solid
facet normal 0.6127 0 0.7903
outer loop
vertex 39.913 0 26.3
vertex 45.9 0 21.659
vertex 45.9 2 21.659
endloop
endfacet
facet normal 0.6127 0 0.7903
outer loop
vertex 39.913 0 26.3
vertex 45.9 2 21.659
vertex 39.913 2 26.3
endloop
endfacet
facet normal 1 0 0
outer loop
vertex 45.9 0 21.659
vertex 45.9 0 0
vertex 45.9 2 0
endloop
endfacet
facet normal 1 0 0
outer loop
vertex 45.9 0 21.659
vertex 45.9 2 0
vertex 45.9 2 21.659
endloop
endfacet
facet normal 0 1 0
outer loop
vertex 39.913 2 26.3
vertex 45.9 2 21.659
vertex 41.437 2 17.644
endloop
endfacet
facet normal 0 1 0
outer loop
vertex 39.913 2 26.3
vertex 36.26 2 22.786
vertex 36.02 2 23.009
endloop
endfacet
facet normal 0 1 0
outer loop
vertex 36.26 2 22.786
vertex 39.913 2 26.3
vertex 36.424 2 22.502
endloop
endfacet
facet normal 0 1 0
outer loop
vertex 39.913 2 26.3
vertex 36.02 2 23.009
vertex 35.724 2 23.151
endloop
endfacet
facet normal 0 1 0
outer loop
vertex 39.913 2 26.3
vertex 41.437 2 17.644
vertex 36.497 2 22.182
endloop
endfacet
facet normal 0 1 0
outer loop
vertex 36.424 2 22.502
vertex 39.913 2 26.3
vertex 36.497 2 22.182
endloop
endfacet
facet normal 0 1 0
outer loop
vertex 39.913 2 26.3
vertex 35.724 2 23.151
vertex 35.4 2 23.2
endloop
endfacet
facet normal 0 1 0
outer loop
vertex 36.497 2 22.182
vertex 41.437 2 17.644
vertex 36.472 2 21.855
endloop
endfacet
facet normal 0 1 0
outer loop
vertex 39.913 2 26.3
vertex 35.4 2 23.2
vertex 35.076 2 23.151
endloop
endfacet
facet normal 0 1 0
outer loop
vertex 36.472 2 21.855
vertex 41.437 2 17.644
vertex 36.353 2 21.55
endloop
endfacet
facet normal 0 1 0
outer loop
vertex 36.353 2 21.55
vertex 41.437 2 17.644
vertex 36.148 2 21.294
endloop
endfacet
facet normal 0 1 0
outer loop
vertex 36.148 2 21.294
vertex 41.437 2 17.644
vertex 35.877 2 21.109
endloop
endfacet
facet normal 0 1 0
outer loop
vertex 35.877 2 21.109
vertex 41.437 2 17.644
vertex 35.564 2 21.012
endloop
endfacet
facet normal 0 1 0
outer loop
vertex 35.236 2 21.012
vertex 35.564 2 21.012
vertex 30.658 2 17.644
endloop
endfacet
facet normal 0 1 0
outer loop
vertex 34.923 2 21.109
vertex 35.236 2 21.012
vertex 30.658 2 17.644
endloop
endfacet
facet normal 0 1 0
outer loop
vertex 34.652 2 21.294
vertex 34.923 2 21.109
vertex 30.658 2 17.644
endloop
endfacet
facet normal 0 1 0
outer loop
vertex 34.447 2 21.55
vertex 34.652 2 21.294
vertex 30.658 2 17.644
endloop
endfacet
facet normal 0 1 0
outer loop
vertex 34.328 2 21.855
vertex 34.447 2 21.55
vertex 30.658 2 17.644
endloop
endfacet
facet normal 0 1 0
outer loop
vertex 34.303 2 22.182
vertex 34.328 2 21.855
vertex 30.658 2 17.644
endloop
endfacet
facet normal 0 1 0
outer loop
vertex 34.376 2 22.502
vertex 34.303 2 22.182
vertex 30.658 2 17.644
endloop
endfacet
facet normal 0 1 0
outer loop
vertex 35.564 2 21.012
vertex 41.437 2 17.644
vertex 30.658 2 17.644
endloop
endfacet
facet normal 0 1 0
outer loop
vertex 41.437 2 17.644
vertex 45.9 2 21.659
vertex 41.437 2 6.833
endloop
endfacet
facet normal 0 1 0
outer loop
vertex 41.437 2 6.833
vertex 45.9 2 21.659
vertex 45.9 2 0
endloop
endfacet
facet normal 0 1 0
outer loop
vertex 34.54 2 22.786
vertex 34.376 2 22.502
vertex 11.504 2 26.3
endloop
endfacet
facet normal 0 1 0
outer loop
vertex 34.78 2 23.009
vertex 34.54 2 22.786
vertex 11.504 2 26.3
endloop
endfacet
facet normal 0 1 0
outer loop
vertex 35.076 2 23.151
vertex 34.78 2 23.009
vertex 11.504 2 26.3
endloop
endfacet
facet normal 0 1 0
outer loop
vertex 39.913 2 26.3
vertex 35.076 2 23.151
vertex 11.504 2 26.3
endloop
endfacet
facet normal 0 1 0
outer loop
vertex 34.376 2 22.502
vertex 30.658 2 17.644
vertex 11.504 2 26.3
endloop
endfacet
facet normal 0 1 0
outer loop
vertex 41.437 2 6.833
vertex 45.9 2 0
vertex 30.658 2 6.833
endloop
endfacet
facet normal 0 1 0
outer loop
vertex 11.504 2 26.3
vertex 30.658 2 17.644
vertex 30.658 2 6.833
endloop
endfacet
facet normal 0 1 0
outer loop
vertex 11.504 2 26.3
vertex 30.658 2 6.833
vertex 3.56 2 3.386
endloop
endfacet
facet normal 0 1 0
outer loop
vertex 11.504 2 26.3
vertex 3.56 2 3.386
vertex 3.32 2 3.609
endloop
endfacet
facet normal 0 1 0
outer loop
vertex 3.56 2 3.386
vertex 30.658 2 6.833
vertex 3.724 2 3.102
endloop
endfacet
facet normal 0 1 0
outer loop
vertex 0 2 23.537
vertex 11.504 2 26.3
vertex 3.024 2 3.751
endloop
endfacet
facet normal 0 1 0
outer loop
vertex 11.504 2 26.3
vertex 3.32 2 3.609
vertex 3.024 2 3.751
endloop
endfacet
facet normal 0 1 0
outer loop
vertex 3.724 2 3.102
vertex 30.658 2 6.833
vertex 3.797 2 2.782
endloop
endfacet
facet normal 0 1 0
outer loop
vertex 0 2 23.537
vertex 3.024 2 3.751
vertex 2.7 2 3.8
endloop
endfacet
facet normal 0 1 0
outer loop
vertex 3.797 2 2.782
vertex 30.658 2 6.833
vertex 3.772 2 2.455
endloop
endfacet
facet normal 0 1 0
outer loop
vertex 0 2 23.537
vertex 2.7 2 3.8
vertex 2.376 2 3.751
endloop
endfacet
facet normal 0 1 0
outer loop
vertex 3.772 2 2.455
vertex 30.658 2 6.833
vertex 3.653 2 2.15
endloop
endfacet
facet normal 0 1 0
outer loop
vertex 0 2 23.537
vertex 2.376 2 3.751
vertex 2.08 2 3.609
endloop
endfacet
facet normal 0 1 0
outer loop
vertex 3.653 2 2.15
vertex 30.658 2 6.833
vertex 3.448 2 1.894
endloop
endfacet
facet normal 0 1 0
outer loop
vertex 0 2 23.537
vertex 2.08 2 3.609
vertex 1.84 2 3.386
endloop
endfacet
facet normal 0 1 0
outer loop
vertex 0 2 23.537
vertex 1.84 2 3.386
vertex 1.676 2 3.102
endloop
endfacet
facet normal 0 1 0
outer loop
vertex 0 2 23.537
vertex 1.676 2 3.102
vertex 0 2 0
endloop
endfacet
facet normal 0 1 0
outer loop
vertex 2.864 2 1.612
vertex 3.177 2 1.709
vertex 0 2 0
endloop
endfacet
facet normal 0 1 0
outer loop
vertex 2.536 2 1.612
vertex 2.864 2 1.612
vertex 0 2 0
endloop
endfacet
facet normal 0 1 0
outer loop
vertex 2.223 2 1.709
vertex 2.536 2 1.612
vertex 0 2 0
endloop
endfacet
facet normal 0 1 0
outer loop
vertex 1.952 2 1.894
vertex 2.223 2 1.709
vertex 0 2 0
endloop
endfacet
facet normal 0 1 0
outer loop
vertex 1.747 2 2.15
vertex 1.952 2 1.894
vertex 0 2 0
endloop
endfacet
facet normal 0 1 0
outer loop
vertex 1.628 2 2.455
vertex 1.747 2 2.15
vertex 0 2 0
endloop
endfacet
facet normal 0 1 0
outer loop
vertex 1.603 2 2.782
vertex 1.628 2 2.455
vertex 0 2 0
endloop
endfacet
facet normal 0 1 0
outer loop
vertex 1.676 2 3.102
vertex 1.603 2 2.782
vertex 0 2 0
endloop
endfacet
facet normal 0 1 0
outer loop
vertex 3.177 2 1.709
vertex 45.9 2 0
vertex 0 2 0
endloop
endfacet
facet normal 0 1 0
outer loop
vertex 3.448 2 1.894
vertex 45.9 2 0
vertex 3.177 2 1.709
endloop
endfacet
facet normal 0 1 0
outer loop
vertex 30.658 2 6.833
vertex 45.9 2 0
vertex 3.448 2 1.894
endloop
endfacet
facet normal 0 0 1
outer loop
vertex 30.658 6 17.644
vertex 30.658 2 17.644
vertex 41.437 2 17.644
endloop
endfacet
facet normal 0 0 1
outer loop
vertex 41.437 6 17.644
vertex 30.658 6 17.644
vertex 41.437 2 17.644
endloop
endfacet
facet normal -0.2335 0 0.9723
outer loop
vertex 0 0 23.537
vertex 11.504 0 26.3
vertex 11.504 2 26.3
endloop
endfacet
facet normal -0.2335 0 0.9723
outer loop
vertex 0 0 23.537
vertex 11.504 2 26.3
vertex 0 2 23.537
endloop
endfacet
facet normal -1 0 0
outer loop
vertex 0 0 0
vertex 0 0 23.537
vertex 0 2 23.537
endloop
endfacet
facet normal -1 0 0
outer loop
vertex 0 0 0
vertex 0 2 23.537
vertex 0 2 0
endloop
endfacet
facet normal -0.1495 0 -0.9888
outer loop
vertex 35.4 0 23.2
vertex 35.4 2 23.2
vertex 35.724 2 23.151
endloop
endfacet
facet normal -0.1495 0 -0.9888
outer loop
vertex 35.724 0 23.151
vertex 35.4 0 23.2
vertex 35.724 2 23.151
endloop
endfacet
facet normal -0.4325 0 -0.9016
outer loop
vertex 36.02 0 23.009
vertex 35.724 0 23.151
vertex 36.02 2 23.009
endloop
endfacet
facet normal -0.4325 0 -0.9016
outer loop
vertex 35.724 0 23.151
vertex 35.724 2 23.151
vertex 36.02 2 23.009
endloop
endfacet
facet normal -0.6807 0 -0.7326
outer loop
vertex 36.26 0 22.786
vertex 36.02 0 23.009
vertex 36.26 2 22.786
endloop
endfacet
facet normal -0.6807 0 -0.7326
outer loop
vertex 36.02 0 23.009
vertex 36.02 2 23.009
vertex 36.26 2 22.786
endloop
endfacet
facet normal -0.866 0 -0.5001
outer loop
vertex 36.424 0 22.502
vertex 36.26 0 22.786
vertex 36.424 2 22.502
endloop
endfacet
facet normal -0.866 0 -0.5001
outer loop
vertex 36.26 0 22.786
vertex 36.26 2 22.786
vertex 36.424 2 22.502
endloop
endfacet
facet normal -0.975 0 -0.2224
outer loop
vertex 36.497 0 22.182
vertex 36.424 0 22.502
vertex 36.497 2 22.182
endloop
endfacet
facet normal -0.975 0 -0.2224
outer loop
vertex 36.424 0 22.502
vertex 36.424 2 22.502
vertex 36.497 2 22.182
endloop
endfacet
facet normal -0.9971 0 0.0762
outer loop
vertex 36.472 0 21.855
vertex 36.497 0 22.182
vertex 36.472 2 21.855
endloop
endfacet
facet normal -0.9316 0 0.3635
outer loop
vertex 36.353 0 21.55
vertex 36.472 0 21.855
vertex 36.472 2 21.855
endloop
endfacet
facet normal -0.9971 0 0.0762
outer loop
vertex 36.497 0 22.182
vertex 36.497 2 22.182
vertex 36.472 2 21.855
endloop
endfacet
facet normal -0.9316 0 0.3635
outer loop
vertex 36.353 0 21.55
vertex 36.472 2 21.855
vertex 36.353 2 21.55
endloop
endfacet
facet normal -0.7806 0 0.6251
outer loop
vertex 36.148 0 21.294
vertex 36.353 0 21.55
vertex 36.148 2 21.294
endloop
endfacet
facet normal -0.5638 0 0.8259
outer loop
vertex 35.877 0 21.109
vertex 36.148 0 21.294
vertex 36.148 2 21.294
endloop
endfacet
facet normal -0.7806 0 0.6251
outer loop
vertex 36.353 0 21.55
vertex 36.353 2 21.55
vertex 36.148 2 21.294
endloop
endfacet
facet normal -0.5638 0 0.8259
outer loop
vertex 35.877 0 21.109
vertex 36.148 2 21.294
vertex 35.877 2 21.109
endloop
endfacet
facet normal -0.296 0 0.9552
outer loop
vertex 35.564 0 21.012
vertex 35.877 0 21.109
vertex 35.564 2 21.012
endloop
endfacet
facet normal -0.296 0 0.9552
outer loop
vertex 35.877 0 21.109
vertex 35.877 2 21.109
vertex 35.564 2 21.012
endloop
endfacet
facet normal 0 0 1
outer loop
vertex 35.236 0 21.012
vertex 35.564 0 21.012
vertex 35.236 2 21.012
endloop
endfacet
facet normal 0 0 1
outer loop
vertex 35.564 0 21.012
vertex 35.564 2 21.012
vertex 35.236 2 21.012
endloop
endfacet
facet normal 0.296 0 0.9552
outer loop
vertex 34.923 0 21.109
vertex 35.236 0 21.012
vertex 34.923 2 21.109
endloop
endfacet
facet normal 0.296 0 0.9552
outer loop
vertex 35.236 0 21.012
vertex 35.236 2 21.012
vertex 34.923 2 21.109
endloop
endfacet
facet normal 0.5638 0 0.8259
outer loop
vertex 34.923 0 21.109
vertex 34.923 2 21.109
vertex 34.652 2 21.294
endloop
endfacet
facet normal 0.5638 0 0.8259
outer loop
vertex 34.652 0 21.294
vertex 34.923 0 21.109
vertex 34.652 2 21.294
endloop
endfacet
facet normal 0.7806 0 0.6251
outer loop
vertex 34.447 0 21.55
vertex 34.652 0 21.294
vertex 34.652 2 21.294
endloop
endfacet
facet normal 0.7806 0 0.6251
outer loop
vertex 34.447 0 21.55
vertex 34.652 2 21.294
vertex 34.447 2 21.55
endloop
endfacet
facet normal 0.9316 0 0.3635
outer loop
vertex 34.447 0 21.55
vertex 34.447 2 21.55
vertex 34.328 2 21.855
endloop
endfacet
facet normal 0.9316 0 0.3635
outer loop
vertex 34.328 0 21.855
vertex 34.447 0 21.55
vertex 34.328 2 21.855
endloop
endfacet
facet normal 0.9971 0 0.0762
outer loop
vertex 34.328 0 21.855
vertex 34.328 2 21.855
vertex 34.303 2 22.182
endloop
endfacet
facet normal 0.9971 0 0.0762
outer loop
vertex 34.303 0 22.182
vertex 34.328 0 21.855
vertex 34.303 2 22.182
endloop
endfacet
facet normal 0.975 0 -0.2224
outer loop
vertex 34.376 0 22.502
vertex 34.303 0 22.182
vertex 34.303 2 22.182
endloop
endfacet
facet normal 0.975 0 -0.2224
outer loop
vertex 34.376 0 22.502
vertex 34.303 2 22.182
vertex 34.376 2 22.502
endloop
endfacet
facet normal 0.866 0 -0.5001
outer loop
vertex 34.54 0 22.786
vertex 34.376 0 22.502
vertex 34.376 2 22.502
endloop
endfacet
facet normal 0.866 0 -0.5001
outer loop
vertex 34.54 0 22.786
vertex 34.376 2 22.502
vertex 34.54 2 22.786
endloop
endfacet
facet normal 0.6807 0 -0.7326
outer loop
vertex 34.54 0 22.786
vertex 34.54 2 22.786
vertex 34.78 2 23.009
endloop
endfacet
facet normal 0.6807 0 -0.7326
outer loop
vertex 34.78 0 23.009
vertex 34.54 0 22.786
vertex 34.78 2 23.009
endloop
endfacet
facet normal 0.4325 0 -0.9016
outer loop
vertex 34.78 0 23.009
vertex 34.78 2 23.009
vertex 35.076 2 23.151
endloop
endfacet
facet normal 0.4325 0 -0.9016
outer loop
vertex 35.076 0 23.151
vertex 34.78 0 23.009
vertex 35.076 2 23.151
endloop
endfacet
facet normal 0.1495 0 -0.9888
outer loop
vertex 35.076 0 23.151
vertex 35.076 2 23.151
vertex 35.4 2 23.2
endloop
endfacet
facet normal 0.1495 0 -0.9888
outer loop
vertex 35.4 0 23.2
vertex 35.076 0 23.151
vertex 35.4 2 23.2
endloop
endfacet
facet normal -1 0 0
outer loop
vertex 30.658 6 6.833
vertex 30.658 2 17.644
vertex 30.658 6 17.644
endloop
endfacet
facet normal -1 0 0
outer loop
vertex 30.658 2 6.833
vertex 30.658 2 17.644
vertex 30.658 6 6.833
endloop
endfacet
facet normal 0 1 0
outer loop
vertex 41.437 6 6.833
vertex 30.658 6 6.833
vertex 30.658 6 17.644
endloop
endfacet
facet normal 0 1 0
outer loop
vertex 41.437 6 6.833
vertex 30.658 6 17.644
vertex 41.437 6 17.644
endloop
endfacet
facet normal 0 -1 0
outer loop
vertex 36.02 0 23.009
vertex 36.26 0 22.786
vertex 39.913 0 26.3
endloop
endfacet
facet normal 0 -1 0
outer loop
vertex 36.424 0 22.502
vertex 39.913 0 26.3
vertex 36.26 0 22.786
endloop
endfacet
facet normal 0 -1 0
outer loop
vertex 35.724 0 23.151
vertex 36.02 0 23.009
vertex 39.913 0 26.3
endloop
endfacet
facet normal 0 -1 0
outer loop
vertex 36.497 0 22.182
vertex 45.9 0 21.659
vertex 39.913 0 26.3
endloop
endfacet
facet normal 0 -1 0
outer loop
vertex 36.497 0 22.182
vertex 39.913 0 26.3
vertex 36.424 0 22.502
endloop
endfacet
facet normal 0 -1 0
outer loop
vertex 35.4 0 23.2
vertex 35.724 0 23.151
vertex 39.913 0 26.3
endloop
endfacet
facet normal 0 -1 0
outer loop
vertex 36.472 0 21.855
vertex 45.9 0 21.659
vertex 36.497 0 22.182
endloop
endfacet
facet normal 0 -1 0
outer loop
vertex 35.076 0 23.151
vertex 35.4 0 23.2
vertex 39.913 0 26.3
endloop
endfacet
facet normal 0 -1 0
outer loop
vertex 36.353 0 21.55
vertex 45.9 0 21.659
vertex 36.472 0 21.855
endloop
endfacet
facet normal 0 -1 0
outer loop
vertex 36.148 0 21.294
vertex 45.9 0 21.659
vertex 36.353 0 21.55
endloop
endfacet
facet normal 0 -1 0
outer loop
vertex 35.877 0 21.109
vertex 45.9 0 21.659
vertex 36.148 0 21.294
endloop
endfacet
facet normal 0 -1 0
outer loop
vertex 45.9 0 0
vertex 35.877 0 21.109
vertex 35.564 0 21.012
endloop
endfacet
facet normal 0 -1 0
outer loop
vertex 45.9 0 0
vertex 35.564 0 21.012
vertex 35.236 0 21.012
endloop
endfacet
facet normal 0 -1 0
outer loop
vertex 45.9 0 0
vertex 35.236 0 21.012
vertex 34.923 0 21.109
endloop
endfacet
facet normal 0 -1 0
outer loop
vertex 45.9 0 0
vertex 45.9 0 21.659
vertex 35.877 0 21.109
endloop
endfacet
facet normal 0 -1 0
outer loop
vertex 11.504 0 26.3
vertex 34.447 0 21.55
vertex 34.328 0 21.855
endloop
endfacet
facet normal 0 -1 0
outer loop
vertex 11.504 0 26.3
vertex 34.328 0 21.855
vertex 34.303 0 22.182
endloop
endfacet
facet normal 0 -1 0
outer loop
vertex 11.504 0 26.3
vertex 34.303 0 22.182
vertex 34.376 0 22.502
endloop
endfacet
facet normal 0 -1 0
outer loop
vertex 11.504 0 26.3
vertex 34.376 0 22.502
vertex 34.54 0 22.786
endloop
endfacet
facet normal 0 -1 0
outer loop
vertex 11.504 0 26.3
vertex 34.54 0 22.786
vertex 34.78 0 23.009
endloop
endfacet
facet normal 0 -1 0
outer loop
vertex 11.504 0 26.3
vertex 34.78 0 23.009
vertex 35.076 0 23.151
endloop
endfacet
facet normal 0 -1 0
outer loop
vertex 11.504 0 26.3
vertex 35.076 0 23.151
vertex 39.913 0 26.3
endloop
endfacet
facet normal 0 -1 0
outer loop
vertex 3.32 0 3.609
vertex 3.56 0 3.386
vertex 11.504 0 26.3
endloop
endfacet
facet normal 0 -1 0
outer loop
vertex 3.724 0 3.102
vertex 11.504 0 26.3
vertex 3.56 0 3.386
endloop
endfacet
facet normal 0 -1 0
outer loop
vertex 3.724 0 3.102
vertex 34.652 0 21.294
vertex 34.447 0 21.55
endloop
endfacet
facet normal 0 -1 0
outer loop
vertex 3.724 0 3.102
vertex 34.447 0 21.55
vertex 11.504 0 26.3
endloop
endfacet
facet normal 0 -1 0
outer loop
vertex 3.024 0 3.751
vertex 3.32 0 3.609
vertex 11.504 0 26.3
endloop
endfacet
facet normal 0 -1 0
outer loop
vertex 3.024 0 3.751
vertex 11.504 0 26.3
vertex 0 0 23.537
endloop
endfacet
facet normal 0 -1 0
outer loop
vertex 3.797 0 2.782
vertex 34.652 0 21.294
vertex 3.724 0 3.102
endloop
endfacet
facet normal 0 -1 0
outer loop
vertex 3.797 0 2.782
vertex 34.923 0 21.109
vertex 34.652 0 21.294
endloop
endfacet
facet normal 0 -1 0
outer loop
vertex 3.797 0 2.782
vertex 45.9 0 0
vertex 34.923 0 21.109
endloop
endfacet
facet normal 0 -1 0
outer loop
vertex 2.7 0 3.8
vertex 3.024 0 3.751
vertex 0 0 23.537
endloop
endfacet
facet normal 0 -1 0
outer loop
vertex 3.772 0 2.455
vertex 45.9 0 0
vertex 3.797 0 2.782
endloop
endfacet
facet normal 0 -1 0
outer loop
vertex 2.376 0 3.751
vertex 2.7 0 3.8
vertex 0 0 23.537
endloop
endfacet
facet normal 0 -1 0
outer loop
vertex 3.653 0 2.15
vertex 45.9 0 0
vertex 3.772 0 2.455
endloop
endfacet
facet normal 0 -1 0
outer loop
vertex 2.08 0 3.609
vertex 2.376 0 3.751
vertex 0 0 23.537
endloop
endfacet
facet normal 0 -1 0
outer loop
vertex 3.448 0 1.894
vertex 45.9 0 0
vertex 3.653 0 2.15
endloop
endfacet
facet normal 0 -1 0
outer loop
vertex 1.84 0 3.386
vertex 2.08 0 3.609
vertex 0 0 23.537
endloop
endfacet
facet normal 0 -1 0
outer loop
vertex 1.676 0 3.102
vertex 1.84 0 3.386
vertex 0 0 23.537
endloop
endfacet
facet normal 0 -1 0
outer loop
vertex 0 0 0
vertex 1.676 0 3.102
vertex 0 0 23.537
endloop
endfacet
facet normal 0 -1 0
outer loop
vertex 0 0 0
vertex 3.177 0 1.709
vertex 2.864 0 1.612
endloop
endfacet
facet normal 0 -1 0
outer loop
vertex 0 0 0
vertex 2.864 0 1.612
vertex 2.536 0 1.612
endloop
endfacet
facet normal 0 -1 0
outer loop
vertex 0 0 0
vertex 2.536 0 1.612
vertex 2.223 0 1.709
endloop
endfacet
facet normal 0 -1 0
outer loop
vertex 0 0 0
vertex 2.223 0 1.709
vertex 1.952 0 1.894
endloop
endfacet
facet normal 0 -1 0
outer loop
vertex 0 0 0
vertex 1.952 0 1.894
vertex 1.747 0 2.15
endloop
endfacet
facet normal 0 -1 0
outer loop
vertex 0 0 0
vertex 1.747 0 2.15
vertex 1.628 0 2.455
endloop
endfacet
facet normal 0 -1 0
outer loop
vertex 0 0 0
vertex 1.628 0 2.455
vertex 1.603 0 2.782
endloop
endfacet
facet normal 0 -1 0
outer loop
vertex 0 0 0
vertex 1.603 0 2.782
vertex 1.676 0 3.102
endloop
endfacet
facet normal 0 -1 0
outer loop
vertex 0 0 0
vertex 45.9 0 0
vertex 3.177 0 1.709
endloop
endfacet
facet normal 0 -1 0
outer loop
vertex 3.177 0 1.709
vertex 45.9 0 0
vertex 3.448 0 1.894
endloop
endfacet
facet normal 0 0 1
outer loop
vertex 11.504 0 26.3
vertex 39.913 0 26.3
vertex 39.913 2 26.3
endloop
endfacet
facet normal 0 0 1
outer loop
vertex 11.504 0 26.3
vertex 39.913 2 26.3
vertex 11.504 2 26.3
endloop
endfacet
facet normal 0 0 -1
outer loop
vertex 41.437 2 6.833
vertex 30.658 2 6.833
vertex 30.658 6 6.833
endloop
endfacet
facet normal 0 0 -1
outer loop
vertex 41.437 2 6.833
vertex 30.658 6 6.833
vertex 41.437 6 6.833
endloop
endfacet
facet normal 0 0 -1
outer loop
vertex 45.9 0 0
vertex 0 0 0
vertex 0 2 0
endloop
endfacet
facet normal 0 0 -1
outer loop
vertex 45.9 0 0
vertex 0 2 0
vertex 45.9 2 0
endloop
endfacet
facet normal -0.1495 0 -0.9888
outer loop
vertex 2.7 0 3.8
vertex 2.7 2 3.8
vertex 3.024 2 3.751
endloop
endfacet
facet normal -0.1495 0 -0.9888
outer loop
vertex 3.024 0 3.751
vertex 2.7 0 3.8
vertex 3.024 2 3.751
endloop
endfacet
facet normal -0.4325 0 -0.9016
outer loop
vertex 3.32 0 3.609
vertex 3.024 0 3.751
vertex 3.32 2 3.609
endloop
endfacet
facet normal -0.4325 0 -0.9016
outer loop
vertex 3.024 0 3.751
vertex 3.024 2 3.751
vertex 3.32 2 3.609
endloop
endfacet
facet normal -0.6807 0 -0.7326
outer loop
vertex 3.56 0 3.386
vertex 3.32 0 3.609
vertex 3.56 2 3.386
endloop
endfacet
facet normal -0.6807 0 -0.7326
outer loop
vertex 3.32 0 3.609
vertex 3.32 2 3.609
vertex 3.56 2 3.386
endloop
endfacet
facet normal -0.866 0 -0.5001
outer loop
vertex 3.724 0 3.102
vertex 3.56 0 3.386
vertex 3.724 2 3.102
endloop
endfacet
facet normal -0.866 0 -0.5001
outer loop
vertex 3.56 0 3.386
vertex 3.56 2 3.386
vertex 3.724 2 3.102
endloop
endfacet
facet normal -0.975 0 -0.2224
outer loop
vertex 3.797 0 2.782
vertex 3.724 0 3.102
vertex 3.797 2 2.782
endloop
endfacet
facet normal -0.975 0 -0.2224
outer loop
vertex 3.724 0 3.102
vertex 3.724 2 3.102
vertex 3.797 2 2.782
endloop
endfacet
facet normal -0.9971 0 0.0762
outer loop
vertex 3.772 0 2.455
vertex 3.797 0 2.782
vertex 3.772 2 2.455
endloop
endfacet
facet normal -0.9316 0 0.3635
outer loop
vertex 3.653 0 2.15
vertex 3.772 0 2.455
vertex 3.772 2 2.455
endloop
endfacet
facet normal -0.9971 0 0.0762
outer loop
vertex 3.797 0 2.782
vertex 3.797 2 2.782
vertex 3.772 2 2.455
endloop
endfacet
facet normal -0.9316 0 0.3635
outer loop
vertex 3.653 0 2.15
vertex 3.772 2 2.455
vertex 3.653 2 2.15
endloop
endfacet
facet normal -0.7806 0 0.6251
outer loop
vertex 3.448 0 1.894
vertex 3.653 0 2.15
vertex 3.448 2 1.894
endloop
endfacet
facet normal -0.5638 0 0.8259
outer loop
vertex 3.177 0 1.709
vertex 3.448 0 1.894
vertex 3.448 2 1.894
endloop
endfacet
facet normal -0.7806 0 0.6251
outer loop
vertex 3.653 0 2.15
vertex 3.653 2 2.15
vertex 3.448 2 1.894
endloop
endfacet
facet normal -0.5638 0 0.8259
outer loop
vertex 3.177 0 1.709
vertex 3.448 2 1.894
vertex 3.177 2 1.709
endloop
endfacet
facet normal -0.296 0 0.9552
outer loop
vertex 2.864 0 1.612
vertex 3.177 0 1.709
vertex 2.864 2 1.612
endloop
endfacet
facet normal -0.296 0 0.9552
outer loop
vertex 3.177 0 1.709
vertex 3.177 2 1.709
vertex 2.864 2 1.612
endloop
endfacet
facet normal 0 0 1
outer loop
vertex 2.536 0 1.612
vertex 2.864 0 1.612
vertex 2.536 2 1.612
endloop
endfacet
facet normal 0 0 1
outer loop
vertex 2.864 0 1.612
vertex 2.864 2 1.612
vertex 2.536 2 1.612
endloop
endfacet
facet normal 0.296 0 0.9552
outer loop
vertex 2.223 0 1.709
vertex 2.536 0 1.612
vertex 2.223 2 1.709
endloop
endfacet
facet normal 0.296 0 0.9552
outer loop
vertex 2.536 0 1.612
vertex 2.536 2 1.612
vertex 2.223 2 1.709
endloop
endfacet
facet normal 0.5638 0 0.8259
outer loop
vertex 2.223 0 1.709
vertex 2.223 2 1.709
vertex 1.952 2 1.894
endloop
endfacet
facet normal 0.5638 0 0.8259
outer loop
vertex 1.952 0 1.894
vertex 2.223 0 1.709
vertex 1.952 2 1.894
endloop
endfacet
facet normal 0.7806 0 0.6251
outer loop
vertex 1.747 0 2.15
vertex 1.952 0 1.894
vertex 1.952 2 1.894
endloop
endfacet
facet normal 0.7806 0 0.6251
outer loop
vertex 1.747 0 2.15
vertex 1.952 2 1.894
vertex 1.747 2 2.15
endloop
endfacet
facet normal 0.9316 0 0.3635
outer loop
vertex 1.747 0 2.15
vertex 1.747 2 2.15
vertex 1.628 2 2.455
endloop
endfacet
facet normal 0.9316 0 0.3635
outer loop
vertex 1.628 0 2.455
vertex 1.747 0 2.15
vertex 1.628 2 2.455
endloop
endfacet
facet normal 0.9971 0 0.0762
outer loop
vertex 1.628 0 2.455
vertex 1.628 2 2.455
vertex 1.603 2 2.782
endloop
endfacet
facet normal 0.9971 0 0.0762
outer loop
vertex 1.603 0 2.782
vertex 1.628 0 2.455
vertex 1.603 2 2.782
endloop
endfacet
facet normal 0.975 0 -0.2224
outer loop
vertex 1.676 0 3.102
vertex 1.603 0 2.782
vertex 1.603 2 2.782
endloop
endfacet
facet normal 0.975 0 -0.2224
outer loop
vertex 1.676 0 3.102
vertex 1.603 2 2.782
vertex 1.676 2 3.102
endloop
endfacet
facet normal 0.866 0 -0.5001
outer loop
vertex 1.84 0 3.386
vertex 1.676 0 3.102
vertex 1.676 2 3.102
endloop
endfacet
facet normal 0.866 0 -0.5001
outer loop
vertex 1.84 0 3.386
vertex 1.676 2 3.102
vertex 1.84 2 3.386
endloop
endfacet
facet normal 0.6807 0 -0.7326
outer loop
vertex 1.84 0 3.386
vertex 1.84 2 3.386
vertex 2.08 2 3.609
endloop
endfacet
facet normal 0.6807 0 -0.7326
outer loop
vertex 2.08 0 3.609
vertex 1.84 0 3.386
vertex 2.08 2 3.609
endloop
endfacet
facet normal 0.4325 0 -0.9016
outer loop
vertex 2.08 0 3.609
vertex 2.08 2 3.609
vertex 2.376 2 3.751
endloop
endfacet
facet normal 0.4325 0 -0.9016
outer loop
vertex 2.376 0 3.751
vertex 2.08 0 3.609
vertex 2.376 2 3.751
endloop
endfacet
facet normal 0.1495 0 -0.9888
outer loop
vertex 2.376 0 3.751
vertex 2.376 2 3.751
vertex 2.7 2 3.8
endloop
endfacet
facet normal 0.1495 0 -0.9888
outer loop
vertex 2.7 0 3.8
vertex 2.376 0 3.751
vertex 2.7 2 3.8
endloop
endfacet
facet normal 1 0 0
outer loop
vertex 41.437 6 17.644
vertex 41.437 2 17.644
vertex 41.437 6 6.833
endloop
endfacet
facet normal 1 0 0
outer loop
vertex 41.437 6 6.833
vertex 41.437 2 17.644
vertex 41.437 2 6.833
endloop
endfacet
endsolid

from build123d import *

# Parameters (mm, degrees)
EXTRUDE_2_DEPTH     = 2
SKETCH_2_W          = 10.779016103
SKETCH_2_H          = 10.811001315
EXTRUDE_3_DEPTH     = 4
SKETCH_3_R          = 1.1
CUT_EXTRUDE_1_DEPTH = 4


with BuildPart() as part:
    # 草图1 → 凸台-拉伸2 (new body)
    with BuildSketch(Plane(origin=(0, 0, 0), x_dir=(1, 0, 0), z_dir=(0, 1, 0))):
        Polygon((0, 0), (45.9, 0), (45.9, -21.658695652), (39.913043478, -26.3), (11.504347826, -26.3), (0, -23.536956522), align=None)
    extrude(amount=EXTRUDE_2_DEPTH)

    # 草图2 → 凸台-拉伸3 (add)
    with BuildSketch(Plane(origin=(0, 2, 0), x_dir=(1, 0, 0), z_dir=(0, 1, 0))):
        with Locations((36.047943901, -12.238421487)):
            Rectangle(SKETCH_2_W, SKETCH_2_H)
    extrude(amount=EXTRUDE_3_DEPTH)

    # 草图3 → 切除-拉伸1 (cut)
    with BuildSketch(Plane(origin=(0, 2, 0), x_dir=(1, 0, 0), z_dir=(0, 1, 0))):
        with Locations(Location((2.7, -2.7, 0), (0, 0, 270))):
            Circle(SKETCH_3_R)
        with Locations(Location((35.4, -22.1, 0), (0, 0, 270))):
            Circle(SKETCH_3_R)
    extrude(amount=-CUT_EXTRUDE_1_DEPTH, mode=Mode.SUBTRACT)


solid = part.part
